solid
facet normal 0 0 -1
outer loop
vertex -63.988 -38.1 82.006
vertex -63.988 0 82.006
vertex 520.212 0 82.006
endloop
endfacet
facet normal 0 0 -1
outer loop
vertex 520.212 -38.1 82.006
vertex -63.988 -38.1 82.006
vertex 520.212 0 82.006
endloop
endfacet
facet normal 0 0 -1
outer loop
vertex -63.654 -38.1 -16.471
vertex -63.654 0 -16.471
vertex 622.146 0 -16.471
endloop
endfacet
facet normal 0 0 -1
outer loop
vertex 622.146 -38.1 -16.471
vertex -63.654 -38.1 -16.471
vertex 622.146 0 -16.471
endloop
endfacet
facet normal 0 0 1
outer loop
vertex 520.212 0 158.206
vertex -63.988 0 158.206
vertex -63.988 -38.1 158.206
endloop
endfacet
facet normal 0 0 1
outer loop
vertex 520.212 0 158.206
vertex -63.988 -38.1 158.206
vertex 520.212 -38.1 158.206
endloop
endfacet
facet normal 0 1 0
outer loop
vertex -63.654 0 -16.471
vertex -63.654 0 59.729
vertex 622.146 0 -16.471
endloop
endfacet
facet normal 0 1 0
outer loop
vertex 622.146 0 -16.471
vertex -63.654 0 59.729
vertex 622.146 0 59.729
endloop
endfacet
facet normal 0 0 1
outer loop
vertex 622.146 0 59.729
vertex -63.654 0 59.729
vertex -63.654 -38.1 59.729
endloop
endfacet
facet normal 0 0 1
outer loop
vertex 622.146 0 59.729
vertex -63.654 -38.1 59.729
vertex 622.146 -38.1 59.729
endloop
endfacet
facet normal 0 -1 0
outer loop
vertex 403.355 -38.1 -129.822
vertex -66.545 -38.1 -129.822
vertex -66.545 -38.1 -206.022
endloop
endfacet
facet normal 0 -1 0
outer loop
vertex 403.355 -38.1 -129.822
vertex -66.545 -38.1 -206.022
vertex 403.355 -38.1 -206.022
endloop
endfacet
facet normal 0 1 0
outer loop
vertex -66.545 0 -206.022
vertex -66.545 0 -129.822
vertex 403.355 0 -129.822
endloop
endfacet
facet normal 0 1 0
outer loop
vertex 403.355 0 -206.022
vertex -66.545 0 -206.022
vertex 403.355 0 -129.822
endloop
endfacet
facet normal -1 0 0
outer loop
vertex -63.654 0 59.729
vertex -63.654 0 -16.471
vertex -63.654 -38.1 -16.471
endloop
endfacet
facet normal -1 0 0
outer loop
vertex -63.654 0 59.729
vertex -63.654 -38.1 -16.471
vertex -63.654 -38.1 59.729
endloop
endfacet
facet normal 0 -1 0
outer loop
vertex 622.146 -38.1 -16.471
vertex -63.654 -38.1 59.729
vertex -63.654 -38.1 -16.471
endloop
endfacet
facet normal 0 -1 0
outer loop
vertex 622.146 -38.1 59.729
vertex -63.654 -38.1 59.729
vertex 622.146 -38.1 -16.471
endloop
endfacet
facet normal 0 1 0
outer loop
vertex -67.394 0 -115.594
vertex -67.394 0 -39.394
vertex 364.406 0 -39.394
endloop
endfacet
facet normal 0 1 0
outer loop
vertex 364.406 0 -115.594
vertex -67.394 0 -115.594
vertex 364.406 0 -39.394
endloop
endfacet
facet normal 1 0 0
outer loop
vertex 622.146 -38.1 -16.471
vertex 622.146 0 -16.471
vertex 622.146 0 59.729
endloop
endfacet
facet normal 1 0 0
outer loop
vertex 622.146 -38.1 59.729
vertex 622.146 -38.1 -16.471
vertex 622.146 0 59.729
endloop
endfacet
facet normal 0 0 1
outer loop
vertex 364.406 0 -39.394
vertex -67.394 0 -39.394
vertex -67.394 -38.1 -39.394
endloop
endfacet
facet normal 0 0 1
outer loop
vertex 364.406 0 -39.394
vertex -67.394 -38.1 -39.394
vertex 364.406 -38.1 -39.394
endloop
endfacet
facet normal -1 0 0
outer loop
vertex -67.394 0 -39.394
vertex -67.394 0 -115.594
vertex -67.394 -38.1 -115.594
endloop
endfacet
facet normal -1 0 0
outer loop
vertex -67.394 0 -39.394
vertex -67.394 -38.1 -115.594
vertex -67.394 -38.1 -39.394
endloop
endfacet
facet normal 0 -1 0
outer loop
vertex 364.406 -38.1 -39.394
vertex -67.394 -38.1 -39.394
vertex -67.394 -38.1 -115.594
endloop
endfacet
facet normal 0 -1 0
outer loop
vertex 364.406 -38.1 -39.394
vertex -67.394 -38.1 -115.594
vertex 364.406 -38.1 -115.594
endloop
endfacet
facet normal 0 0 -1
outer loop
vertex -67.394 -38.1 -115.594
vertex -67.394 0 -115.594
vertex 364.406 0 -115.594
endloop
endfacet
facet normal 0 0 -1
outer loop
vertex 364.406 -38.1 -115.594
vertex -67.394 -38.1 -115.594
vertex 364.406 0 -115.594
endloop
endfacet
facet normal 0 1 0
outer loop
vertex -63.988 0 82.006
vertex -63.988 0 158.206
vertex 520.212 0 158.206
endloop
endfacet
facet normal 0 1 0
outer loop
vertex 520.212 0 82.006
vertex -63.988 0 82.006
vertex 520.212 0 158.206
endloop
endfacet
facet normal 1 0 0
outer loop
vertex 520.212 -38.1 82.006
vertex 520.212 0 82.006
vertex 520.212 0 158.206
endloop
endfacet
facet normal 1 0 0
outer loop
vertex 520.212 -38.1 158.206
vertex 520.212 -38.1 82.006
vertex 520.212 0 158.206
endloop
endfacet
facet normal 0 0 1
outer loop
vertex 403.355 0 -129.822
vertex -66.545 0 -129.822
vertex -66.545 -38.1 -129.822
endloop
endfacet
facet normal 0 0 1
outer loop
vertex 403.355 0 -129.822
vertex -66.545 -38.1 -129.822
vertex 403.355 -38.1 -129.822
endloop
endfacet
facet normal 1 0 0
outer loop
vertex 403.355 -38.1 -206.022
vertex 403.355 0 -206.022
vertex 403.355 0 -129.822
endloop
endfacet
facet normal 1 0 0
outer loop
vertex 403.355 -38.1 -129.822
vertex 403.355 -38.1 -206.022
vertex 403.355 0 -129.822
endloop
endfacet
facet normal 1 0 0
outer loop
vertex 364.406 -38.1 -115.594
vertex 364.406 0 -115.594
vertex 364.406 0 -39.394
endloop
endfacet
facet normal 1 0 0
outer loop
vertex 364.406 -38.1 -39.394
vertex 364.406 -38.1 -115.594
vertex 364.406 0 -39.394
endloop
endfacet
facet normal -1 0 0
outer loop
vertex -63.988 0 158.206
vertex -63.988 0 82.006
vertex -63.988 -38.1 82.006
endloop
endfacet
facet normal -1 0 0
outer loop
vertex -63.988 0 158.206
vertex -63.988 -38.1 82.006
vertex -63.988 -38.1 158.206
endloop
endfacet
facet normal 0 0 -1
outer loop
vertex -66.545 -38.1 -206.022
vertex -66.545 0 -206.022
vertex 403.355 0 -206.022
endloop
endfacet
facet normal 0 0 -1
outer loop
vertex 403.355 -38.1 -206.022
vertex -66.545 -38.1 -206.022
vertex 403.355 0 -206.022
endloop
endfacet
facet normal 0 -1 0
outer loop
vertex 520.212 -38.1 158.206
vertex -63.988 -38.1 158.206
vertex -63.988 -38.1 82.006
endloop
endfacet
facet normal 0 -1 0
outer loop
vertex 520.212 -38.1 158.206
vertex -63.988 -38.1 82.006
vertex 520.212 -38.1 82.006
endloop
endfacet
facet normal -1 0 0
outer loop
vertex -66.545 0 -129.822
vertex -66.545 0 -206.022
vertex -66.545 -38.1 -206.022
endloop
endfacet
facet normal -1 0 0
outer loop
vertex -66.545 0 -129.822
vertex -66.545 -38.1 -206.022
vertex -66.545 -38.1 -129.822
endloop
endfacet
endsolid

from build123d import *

# Parameters (mm, degrees)
F0_W     = 584.2
F0_H     = 76.2
F0_W_2   = 685.8
F0_W_3   = 431.8
F1_DEPTH = 38.1
F0_W_4   = 469.9
F2_DEPTH = 38.1


with BuildPart() as f1:
    # F0 (on Front) → F1 (new body)
    with BuildSketch(Plane.XZ):
        with Locations((228.111657, 120.105898)):
            Rectangle(F0_W, F0_H)
        with Locations((279.246337, 21.6287)):
            Rectangle(F0_W_2, F0_H)
        with Locations((148.505848, -77.494022)):
            Rectangle(F0_W_3, F0_H)
    extrude(amount=F1_DEPTH)


with BuildPart() as f2:
    # F0 (on Front) → F2 (new body)
    with BuildSketch(Plane.XZ):
        with Locations((168.4054, -167.921652)):
            Rectangle(F0_W_4, F0_H)
    extrude(amount=F2_DEPTH)


solid = Compound([f1.part, f2.part])
